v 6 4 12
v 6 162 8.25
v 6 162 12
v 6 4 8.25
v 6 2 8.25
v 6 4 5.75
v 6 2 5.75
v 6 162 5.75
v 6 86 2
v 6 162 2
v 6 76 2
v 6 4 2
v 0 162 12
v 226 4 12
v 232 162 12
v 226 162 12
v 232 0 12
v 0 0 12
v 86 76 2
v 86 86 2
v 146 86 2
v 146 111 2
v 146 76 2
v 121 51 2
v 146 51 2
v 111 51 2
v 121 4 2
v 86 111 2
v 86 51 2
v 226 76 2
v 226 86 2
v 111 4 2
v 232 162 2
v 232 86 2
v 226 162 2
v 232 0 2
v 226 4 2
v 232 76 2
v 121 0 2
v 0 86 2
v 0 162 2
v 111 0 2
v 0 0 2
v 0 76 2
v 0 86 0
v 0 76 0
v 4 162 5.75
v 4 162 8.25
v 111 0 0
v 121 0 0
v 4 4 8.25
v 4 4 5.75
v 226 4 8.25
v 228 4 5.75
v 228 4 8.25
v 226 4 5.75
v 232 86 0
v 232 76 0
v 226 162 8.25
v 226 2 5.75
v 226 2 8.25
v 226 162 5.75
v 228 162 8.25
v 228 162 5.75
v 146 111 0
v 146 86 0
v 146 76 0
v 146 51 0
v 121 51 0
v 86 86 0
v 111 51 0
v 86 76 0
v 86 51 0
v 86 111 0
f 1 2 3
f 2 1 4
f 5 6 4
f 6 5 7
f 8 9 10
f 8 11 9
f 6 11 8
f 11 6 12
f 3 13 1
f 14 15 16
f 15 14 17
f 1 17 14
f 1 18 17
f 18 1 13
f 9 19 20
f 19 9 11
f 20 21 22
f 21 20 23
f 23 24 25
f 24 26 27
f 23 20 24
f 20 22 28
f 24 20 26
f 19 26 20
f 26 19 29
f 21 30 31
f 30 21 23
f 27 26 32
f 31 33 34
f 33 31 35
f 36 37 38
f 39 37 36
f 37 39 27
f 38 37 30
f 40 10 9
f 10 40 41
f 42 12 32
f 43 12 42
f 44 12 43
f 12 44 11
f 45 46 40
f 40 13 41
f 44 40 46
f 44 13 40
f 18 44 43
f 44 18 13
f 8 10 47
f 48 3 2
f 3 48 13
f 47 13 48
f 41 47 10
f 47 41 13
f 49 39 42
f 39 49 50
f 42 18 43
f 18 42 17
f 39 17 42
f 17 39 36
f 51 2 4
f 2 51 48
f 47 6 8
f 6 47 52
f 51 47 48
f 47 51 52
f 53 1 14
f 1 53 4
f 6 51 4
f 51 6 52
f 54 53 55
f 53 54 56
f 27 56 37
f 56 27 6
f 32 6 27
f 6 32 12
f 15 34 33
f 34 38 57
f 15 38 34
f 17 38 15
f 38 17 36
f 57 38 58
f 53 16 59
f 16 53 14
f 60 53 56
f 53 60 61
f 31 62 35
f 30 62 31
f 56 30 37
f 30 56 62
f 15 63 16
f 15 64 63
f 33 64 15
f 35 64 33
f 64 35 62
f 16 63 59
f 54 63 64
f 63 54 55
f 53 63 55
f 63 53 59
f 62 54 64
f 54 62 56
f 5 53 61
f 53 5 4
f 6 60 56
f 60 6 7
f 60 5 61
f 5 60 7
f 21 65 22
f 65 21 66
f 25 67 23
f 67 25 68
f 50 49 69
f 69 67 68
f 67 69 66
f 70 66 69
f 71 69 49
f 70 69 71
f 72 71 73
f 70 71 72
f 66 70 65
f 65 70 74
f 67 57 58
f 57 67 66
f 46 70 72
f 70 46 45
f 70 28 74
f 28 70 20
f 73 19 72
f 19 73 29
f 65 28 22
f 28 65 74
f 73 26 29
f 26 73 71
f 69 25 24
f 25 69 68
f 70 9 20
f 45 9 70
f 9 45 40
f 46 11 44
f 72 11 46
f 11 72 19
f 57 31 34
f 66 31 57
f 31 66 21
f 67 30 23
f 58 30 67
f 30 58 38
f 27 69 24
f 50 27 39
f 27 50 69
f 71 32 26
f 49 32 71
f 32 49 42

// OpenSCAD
// file: parameters.scad
// Shared parameters for epdiy case design
// Single source of truth for all dimensions and design parameters

// E-ink screen dimensions (non-active part)
eink_width = 220;
eink_height = 158;
eink_thickness = 2; // Assumed thickness

// Active part dimensions
active_offset_x = 12;
active_offset_y = 12;
active_width = 202.8;
active_height = 139.4;

// Thicker ribbon dimensions
thick_ribbon_width = 182;
thick_ribbon_height = 20;
thick_ribbon_offset_x = 20; // from left of non-active part

// PCB connection ribbon dimensions  
pcb_ribbon_width = 17;
pcb_ribbon_height = 20;
pcb_ribbon_offset_x = 20; // from left of thicker ribbon

// PCB dimensions
pcb_width = 97;
pcb_height = 55;
pcb_thickness = 1.6; // Standard PCB thickness

// Mounting hole positions (relative to PCB origin)
mounting_holes = [
    [27.5, 12],
    [122.5, 12], 
    [27.5, 62],
    [122.5, 62]
];

// Design parameters for e-ink holder
arm_thickness = 6;
arm_length = 10;
groove_depth = 2;
groove_width = eink_thickness + 0.5; // Screen thickness + clearance
wall_height = 1.5;
bottom_arm_thickness = 4;

// Calculate case dimensions to accommodate screen size
case_width = eink_width + 2 * arm_thickness;  // 220 + 12 = 232mm
case_height = eink_height + bottom_arm_thickness; // 158 + 4 = 162mm

// Back structure parameters for e-ink holder
back_thickness = 2;
center_size = 60;
tendril_width = 10;

// PCB holder parameters
screw_hole_diameter = 3.2; // M3 screws
screw_head_diameter = 6;
screw_head_depth = 2;
standoff_height = 5;

// Calculate PCB holder dimensions to encompass all mounting holes
min_hole_x = min([for (hole = mounting_holes) hole[0]]) - 10;
max_hole_x = max([for (hole = mounting_holes) hole[0]]) + 10;
min_hole_y = min([for (hole = mounting_holes) hole[1]]) - 10;
max_hole_y = max([for (hole = mounting_holes) hole[1]]) + 10;

pcb_holder_width = max_hole_x - min_hole_x;
pcb_holder_height = max_hole_y - min_hole_y;

// Complete case parameters
case_thickness = 8; // Total thickness for back-to-back mounting
// main file
// E-ink screen holder for epdiy case
// Based on specifications from instructions.md

include <parameters.scad>

// Just the e-ink arms with grooves (no back structure)
module eink_arms() {
    // Left arm with groove
    difference() {
        cube([arm_thickness, case_height, arm_length]);
        translate([arm_thickness - groove_depth, bottom_arm_thickness, (arm_length - groove_width) / 2])
            cube([groove_depth, case_height - bottom_arm_thickness, groove_width]);
    }
    
    // Right arm with groove  
    translate([case_width - arm_thickness, 0, 0])
    difference() {
        cube([arm_thickness, case_height, arm_length]);
        translate([0, bottom_arm_thickness, (arm_length - groove_width) / 2])
            cube([groove_depth, case_height - bottom_arm_thickness, groove_width]);
    }
    
    // Bottom arm with groove (thinner than sides)
    difference() {
        cube([case_width, bottom_arm_thickness, arm_length]);
        translate([arm_thickness, bottom_arm_thickness - groove_depth, (arm_length - groove_width) / 2])
            cube([case_width - 2*arm_thickness, groove_depth, groove_width]);
    }
}

// Full e-ink holder with back structure (for standalone printing)
module eink_holder() {
    // Central back plate (for PCB mounting)
    translate([(case_width - center_size) / 2, (case_height - center_size) / 2, 0])
        cube([center_size, center_size, back_thickness]);
    
    // Tendril to left arm (extends from center to left arm)
    translate([0, (case_height - tendril_width) / 2, 0])
        cube([(case_width - center_size) / 2 + center_size / 2, tendril_width, back_thickness]);
    
    // Tendril to right arm (extends from center to right arm)
    translate([(case_width - center_size) / 2 + center_size, (case_height - tendril_width) / 2, 0])
        cube([(case_width - center_size) / 2, tendril_width, back_thickness]);
    
    // Tendril to bottom arm (extends from center to bottom arm)
    translate([(case_width - tendril_width) / 2, 0, 0])
        cube([tendril_width, (case_height - center_size) / 2 + center_size / 2, back_thickness]);
    
    // Add the arms
    translate([0, 0, back_thickness])
    eink_arms();
}

eink_holder();
